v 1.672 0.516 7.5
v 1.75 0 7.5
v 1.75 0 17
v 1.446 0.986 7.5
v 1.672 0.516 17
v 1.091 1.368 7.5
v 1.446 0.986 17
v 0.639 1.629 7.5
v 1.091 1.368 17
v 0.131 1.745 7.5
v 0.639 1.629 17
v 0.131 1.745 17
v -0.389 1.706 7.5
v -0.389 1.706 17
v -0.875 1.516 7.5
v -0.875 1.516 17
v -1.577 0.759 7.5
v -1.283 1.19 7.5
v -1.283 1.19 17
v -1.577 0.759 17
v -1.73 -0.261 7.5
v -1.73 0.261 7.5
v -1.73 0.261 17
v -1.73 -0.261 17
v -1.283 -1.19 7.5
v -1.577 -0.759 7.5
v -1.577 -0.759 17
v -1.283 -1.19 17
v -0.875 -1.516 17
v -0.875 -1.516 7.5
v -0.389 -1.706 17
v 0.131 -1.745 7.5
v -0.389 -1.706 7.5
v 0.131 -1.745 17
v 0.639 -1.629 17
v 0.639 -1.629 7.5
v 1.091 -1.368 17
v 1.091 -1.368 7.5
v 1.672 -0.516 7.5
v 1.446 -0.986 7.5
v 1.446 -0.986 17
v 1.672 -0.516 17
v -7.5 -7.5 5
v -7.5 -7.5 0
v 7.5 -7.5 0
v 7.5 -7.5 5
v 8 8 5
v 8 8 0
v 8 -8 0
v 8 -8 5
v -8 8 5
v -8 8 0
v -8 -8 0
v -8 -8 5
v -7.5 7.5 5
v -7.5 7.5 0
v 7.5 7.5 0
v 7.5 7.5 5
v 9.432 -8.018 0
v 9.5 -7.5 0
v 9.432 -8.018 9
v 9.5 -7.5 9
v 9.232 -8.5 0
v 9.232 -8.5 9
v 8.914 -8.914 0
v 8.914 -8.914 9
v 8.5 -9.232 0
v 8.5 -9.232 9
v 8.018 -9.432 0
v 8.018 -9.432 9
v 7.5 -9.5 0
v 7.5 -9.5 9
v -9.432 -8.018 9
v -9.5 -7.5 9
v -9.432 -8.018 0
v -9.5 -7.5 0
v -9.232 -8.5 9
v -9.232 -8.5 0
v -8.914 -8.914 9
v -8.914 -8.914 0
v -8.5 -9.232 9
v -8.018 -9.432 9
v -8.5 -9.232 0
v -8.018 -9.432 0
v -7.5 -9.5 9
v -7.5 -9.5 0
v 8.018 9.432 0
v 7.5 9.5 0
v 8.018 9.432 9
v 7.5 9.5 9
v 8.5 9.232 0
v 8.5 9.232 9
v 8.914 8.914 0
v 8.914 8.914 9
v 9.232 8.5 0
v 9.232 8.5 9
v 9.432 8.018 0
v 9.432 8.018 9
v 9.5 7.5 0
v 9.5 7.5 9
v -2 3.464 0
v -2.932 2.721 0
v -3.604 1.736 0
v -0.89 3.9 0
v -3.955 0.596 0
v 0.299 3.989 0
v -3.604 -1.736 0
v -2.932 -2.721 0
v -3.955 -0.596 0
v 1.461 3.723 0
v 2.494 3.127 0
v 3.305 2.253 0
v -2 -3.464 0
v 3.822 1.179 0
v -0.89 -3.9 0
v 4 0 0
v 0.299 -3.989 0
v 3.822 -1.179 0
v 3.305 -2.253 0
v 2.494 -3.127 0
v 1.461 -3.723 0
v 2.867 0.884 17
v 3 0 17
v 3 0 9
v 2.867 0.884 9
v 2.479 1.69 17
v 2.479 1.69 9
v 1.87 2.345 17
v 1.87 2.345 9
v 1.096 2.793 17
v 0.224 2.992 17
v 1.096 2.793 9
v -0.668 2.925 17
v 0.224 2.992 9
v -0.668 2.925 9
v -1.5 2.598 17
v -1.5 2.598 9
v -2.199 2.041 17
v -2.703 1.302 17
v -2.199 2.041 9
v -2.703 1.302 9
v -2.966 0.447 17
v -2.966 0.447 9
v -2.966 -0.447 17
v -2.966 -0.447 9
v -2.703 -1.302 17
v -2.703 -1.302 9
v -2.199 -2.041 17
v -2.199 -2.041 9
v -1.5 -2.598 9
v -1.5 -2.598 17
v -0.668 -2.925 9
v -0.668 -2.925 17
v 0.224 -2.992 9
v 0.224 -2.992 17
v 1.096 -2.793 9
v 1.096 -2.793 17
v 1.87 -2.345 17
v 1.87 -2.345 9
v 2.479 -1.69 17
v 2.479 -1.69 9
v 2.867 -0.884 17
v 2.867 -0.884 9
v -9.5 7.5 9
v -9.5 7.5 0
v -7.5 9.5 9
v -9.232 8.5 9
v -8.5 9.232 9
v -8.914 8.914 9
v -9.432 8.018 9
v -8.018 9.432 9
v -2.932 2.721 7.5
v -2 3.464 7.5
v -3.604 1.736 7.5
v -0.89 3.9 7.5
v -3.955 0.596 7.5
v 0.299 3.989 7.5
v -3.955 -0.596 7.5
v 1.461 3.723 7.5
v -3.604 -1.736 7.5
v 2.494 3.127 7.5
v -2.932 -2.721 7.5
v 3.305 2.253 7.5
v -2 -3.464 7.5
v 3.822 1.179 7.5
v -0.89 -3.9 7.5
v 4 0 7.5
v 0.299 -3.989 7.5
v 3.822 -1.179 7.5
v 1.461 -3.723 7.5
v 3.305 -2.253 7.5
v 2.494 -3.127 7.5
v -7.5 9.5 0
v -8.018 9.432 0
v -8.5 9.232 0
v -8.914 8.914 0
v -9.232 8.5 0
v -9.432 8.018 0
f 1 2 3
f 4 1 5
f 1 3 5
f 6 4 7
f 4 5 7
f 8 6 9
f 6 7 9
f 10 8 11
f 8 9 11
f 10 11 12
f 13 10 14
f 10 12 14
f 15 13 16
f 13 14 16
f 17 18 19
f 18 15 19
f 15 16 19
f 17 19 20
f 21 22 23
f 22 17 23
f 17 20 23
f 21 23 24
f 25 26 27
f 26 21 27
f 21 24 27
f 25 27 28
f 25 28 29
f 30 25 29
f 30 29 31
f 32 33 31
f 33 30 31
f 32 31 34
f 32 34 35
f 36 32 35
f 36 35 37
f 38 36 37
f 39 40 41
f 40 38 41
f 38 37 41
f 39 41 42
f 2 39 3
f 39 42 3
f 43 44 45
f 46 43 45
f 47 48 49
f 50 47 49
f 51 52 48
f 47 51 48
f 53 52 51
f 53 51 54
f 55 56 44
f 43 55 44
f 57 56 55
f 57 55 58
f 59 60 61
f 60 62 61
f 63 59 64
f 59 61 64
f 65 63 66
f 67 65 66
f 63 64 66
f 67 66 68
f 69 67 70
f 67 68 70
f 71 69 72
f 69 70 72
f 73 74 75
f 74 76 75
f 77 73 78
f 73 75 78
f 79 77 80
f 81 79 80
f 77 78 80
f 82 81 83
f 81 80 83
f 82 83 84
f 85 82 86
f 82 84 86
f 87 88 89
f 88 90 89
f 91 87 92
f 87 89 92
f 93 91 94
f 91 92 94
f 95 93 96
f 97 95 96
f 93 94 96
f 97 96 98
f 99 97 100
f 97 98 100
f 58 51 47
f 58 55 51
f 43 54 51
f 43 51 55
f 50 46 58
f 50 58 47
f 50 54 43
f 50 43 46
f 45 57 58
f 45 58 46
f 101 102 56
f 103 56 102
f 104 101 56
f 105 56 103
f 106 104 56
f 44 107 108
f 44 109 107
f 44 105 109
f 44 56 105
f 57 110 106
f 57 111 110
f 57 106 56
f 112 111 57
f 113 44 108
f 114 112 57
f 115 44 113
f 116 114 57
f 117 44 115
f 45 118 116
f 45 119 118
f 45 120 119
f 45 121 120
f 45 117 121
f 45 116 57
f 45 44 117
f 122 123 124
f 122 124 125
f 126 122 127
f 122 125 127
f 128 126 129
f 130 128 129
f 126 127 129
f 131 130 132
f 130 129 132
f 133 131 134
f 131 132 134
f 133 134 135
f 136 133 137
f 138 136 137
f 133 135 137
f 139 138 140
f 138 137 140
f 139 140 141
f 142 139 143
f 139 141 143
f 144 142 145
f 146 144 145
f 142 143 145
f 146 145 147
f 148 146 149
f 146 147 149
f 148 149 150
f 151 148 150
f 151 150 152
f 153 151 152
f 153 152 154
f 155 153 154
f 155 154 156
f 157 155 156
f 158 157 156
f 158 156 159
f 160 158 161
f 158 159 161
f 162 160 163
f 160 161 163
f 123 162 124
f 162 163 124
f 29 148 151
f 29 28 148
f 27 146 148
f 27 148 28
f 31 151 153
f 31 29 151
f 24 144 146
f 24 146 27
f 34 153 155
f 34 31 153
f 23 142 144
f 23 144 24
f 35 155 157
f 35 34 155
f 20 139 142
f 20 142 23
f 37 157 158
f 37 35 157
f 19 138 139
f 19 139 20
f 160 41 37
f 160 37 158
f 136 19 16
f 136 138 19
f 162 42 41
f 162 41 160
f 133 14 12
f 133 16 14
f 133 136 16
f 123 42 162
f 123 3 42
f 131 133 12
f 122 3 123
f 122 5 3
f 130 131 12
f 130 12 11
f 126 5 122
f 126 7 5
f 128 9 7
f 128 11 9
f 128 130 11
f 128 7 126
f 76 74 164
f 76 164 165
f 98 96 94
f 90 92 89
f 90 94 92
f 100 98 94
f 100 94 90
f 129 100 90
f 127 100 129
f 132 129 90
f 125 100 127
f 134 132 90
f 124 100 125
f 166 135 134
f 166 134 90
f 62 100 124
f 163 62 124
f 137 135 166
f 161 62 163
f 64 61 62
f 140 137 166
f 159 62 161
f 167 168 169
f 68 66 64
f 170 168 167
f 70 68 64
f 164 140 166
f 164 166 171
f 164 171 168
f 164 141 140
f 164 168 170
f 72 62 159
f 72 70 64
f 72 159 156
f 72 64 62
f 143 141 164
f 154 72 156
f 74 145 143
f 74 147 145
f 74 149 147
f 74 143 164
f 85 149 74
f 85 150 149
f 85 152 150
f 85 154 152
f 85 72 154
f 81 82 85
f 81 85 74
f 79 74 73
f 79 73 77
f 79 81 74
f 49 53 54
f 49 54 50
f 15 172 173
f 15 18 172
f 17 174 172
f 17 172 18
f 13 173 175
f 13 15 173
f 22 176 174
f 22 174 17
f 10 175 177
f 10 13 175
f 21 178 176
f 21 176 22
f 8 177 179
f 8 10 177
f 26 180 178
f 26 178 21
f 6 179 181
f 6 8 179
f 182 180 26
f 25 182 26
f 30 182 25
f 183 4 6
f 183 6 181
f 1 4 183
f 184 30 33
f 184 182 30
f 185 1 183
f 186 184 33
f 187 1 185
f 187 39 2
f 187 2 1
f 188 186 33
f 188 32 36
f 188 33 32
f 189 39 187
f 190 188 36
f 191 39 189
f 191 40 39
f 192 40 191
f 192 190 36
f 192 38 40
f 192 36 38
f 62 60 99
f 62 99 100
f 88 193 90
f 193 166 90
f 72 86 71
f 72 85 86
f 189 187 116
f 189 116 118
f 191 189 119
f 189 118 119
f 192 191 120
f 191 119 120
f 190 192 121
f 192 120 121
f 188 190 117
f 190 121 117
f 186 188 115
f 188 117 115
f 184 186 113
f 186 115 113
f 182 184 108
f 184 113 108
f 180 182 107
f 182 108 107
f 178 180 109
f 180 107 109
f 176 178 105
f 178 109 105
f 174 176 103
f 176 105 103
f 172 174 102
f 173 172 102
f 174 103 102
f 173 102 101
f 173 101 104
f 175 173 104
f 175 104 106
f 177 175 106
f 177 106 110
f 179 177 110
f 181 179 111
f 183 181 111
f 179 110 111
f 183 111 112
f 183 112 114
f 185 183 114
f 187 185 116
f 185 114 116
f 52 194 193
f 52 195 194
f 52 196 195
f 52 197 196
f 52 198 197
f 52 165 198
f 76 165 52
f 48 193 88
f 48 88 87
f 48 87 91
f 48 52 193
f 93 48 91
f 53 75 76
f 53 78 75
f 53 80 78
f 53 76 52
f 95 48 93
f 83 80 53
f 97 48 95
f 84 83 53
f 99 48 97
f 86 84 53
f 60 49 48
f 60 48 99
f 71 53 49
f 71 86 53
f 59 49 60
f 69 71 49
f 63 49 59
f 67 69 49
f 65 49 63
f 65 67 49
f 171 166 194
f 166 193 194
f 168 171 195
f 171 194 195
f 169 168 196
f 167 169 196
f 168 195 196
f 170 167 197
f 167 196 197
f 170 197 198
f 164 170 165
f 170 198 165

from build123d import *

# Parameters (mm, degrees)
F1_DEPTH  = 9.5
F2_R      = 3
F3_DEPTH  = 8
F4_R      = 1.75
F5_DEPTH  = 17
F6_W      = 16
F6_H      = 16
F6_W_2    = 15
F6_H_2    = 15
F7_DEPTH  = 5
F8_R      = 2
F9_R      = 4
F9_R_2    = 1.75
F10_DEPTH = 7.5


with BuildPart() as f1:
    # F0 (on Front) → F1 (new body, symmetric)
    with BuildSketch(Plane.XZ):
        Polygon((-9.5, 0), (0, 0), (9.5, 0), (9.5, 9), (-9.5, 9), align=None)
    extrude(amount=F1_DEPTH, both=True)

    # F2 (on face) → F3 (join)
    with BuildSketch(Plane.XY.offset(9)):
        Circle(F2_R)
    extrude(amount=F3_DEPTH)

    # F4 (on face) → F5 (cut)
    with BuildSketch(Plane.XY.offset(17)):
        Circle(F4_R)
    extrude(amount=-F5_DEPTH, mode=Mode.SUBTRACT)

    # F6 (on face) → F7 (cut)
    with BuildSketch(Plane(origin=(0, 0, 0), x_dir=(1, 0, 0), z_dir=(0, 0, -1))):
        Rectangle(F6_W, F6_H)
        Rectangle(F6_W_2, F6_H_2, mode=Mode.SUBTRACT)
    extrude(amount=-F7_DEPTH, mode=Mode.SUBTRACT)

    # F8
    f8_edges = [f1.edges().sort_by_distance(p)[0] for p in [
        (-9.5, -9.5, 4.5),
        (9.5, -9.5, 4.5),
        (-9.5, 9.5, 4.5),
        (9.5, 9.5, 4.5),
    ]]
    fillet(f8_edges, radius=F8_R)

    # F9 (on face) → F10 (cut)
    with BuildSketch(Plane(origin=(0, 0, 0), x_dir=(1, 0, 0), z_dir=(0, 0, -1))):
        Circle(F9_R)
        Circle(F9_R_2, mode=Mode.SUBTRACT)
    extrude(amount=-F10_DEPTH, mode=Mode.SUBTRACT)


solid = f1.part
